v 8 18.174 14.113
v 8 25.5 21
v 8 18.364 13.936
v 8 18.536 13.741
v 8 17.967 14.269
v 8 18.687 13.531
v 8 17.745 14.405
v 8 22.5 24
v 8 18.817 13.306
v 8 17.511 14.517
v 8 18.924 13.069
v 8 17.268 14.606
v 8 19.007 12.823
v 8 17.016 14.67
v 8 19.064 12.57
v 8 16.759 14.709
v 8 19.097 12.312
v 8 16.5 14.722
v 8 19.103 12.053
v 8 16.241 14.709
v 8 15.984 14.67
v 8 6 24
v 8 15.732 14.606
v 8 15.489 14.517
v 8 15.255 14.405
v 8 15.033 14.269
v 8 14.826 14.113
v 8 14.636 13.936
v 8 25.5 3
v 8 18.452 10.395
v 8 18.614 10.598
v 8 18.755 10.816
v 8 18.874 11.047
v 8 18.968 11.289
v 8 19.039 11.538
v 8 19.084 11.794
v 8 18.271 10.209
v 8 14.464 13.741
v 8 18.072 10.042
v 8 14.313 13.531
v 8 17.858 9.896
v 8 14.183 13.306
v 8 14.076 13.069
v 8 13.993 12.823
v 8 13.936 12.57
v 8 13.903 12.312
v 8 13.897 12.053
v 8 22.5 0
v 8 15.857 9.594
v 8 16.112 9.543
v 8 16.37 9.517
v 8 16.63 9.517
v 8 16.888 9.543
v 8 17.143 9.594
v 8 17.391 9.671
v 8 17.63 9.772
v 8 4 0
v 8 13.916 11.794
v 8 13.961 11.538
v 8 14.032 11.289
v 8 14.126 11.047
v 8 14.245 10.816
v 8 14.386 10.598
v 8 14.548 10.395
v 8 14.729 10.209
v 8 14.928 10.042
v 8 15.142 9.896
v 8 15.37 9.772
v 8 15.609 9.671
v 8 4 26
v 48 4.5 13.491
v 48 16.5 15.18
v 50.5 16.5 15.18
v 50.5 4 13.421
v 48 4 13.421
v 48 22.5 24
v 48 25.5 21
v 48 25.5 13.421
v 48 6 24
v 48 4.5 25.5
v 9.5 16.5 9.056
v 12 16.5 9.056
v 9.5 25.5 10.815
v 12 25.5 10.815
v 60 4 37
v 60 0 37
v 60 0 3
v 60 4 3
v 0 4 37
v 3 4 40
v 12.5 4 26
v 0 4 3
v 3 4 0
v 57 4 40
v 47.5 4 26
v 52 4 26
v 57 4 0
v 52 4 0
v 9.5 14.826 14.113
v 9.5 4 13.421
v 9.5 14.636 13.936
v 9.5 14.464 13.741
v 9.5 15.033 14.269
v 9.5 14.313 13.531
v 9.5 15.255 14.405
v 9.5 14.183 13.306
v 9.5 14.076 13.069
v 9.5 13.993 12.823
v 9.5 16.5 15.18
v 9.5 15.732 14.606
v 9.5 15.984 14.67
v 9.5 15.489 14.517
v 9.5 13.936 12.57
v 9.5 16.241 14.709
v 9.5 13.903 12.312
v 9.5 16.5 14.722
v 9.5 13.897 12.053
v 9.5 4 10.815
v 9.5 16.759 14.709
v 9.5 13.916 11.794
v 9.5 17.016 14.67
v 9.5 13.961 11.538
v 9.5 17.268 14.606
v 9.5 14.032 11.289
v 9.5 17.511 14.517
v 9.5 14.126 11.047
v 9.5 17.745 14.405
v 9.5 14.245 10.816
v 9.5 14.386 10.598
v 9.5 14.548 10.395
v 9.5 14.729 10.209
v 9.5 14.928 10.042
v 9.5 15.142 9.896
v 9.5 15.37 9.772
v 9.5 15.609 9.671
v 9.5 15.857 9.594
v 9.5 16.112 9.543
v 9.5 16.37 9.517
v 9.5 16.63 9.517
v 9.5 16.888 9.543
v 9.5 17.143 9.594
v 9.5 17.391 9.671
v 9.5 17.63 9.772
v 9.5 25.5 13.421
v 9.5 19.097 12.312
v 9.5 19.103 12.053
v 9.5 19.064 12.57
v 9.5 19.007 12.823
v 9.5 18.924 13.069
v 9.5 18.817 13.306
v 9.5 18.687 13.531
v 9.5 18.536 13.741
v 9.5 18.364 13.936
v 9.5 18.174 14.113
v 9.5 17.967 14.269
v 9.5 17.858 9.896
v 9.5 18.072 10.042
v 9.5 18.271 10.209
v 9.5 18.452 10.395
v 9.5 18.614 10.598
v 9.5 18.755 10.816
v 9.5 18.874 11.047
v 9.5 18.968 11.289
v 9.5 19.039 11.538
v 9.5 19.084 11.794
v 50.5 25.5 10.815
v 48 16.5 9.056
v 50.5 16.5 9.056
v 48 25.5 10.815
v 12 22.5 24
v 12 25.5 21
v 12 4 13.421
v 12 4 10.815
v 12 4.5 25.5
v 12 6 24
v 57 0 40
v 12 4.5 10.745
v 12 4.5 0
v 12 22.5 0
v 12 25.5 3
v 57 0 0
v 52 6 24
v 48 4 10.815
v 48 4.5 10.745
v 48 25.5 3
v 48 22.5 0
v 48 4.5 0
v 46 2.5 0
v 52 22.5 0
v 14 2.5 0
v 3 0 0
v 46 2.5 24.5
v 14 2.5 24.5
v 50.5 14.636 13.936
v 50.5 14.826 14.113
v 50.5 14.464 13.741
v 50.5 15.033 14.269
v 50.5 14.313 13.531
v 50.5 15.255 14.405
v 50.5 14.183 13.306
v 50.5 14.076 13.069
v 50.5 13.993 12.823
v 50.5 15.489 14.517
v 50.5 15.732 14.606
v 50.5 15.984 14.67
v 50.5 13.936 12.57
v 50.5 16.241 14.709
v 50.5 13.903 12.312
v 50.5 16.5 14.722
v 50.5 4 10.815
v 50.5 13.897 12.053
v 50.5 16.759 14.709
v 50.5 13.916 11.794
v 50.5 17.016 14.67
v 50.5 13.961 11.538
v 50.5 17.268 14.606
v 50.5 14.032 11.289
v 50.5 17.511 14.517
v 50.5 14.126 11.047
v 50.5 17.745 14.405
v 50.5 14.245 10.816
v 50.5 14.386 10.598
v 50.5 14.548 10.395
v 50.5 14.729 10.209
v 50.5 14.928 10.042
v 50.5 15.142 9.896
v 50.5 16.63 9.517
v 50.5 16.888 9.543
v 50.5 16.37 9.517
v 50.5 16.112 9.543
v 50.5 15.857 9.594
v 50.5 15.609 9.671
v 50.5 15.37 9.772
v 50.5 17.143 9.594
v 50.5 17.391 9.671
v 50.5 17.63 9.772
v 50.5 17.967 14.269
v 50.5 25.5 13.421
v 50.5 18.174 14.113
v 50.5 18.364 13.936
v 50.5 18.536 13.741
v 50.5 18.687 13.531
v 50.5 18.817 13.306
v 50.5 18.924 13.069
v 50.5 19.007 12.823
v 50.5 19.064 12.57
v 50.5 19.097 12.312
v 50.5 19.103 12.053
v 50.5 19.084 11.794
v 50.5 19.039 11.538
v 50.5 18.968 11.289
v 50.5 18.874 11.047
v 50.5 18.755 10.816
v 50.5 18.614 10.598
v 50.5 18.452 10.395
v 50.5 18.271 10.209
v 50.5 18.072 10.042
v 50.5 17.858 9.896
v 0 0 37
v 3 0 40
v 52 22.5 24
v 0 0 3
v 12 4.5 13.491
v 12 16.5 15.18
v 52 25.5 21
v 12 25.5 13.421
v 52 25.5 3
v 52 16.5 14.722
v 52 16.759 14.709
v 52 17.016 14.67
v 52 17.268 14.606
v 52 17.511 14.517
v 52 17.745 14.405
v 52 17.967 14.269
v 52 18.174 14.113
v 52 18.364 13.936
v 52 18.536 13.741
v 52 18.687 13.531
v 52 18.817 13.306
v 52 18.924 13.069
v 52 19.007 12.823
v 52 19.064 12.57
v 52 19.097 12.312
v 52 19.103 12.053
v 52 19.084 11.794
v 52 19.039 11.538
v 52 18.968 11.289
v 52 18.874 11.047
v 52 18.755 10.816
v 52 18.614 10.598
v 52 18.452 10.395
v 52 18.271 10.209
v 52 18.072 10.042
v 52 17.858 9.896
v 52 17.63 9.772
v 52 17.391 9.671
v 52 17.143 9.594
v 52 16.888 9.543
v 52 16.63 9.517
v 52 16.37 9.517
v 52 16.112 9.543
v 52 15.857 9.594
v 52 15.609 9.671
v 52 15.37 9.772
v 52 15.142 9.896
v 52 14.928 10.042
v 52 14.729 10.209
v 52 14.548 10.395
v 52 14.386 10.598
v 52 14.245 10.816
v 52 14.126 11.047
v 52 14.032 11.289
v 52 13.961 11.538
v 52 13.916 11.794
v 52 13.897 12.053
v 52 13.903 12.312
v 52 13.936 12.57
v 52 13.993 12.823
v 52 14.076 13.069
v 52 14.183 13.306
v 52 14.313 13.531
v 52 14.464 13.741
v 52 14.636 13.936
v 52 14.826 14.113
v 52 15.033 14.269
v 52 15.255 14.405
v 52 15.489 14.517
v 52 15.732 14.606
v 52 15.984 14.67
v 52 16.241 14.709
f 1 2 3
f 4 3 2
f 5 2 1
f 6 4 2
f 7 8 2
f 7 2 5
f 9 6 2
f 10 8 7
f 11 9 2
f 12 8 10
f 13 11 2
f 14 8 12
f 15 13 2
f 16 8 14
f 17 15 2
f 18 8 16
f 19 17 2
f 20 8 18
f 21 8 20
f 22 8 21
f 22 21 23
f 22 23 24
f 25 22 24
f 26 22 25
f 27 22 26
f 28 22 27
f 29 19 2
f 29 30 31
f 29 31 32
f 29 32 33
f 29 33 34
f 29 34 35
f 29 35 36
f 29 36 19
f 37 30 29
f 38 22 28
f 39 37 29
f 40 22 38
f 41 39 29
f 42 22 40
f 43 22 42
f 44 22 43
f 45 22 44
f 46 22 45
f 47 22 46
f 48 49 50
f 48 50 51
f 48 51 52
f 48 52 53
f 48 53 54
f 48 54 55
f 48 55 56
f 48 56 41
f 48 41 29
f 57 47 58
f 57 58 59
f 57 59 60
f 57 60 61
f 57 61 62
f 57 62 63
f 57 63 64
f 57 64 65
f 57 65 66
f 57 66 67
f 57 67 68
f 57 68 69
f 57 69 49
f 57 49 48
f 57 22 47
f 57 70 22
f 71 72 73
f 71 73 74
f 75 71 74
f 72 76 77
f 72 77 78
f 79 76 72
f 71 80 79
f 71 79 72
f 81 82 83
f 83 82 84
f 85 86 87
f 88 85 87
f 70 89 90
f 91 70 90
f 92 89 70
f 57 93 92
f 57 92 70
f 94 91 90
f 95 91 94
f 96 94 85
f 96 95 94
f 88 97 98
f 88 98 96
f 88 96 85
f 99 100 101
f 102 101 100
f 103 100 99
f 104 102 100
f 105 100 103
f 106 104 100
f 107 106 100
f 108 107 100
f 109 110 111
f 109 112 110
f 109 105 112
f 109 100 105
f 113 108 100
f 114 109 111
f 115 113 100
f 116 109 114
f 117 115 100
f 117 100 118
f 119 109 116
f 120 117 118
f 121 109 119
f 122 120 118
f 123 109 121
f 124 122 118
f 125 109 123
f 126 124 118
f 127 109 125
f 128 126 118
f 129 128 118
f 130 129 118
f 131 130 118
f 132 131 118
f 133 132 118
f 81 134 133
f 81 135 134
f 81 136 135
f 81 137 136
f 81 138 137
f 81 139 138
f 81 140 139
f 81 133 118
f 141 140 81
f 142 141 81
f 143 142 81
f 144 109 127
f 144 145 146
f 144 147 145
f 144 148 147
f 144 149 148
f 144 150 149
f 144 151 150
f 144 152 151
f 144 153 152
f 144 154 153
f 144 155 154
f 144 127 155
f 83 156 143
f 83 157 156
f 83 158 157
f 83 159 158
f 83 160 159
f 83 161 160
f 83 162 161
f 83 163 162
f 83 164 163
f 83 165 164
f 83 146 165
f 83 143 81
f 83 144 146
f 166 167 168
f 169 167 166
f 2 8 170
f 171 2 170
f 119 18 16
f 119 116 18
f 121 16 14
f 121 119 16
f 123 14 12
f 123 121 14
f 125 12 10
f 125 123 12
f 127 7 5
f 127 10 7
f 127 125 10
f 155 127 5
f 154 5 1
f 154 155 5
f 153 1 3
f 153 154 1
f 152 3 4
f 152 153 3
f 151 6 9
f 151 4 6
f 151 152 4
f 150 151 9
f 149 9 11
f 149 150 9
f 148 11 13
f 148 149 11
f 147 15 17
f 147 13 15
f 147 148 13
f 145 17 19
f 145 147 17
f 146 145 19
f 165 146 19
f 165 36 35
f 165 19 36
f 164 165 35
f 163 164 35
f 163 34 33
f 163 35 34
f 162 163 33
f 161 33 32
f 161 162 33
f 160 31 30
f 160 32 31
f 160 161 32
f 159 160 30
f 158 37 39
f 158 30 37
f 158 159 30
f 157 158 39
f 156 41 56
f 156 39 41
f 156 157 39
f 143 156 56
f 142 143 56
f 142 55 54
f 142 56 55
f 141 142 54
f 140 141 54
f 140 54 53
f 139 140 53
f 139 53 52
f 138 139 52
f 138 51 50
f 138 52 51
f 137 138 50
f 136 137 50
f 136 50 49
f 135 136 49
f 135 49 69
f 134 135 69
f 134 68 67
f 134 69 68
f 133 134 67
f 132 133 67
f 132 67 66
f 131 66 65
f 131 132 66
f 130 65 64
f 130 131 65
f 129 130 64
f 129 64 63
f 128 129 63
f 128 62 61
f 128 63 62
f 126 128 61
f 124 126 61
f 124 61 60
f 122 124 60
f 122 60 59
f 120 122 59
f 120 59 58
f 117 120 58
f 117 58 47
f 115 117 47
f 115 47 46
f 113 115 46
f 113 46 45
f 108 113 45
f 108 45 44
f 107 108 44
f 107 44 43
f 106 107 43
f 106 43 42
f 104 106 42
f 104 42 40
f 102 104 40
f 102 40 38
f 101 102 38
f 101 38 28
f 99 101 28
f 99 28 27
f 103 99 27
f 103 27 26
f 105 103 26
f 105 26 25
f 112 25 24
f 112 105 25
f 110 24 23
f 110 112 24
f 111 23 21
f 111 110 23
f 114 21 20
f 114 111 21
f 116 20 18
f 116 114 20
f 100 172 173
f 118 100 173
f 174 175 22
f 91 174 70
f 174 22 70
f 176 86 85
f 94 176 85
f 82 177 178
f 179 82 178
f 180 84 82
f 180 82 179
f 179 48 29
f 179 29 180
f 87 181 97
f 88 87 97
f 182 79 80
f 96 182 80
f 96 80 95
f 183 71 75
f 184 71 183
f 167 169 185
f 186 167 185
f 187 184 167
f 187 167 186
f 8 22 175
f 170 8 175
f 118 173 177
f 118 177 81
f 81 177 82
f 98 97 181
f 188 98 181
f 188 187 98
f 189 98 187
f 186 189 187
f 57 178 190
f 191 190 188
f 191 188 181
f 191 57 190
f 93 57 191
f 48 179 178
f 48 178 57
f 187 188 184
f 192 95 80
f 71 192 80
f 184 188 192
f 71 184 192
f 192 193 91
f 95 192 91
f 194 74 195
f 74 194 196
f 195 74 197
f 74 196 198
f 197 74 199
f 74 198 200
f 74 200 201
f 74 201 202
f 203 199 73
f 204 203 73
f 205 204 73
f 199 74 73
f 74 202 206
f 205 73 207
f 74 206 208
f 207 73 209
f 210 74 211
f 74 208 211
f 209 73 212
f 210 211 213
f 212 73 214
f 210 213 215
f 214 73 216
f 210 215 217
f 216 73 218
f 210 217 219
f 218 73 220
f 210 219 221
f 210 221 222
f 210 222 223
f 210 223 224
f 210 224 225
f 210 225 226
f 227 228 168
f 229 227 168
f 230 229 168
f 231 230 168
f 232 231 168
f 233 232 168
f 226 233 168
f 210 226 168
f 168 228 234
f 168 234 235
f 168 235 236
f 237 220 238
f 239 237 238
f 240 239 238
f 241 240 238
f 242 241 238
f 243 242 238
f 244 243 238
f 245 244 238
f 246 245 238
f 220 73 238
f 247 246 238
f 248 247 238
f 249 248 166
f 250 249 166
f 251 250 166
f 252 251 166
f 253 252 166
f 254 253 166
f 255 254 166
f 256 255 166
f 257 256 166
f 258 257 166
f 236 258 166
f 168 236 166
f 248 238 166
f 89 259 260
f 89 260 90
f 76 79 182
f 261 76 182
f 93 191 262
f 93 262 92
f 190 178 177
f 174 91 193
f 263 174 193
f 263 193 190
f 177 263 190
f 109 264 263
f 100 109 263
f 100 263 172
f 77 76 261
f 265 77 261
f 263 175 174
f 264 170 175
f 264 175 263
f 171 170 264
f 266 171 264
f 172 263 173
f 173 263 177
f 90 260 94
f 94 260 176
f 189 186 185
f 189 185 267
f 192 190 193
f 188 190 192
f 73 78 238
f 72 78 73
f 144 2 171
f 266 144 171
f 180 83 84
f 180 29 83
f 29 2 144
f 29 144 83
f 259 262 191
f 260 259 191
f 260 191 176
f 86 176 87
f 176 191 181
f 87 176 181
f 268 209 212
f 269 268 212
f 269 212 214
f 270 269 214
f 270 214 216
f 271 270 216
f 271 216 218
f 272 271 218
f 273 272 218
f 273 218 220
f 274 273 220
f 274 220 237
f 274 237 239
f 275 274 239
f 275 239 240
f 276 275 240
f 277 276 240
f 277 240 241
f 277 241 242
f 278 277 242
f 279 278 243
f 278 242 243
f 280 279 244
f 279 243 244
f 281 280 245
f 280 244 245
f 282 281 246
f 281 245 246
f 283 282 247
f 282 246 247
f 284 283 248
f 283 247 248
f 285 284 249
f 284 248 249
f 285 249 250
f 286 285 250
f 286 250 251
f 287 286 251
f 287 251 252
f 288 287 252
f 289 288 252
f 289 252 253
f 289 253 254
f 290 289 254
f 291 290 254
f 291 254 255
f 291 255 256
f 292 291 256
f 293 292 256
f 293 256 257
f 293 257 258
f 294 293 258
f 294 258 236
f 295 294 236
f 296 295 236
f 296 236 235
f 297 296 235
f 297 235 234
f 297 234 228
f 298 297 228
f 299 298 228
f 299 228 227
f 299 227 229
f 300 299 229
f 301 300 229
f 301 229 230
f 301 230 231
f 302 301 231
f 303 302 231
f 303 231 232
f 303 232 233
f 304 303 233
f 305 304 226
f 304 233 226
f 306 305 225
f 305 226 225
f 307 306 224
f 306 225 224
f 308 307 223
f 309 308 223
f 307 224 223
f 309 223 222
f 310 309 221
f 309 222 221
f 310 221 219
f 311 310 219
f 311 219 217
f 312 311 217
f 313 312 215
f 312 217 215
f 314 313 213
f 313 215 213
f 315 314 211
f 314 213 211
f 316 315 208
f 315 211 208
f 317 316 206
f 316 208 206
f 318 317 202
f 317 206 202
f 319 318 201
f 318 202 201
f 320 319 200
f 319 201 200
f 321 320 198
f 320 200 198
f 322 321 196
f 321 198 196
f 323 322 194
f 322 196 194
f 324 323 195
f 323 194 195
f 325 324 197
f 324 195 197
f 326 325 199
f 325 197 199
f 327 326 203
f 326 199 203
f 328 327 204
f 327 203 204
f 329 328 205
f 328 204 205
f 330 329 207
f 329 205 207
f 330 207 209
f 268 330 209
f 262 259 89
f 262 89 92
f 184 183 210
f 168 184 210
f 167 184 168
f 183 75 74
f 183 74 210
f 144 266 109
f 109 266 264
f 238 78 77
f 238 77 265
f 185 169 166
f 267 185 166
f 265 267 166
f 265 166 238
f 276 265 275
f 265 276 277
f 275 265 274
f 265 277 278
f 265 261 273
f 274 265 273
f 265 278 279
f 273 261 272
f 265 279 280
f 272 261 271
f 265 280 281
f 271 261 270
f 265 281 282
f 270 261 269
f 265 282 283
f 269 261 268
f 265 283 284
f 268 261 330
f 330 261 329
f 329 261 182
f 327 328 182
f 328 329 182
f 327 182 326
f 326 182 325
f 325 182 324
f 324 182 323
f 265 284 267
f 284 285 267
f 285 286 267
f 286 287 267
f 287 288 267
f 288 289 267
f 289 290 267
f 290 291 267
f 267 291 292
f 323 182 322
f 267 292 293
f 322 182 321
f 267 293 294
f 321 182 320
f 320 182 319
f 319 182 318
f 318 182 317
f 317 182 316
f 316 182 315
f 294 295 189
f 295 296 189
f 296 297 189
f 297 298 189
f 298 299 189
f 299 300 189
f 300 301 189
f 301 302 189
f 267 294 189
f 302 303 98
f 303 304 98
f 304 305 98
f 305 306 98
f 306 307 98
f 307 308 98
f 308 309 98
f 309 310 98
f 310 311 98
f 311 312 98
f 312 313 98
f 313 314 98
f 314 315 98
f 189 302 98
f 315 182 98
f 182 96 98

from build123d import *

# Parameters (mm, degrees)
SKETCH1_W           = 60
SKETCH1_H           = 40
BOSS_EXTRUDE1_DEPTH = 4
CHAMFER1_SIZE       = 3
SKETCH2_W           = 36
SKETCH2_H           = 24
CUT_EXTRUDE1_DEPTH  = 1.5
SKETCH3_W           = 4
SKETCH3_H           = 24
BOSS_EXTRUDE2_DEPTH = 23
CHAMFER2_SIZE       = 3
CHAMFER3_SIZE       = 2
CHAMFER4_SIZE       = 2
CHAMFER5_SIZE       = 2
CUT_EXTRUDE2_DEPTH  = 2.5
SKETCH7_R           = 2.604037506
CUT_EXTRUDE3_DEPTH  = 70.285640648
CUT_EXTRUDE4_DEPTH  = 2.5
SKETCH12_R          = 2.604037506
CUT_EXTRUDE6_DEPTH  = 68.485183559


with BuildPart() as part:
    # Sketch1 → Boss-Extrude1 (new body)
    with BuildSketch(Plane(origin=(0, 0, 0), x_dir=(1, 0, 0), z_dir=(0, 1, 0))):
        with Locations((30, -20)):
            Rectangle(SKETCH1_W, SKETCH1_H)
    extrude(amount=BOSS_EXTRUDE1_DEPTH)

    # Chamfer1
    chamfer1_edges = [part.edges().sort_by_distance(p)[0] for p in [
        (0, 2, 0),
        (60, 2, 0),
        (60, 2, 40),
        (0, 2, 40),
    ]]
    chamfer(chamfer1_edges, length=CHAMFER1_SIZE)

    # Sketch2 → Cut-Extrude1 (cut)
    with BuildSketch(Plane(origin=(0, 4, 0), x_dir=(1, 0, 0), z_dir=(0, 1, 0))):
        with Locations((30, -12)):
            Rectangle(SKETCH2_W, SKETCH2_H)
    extrude(amount=-CUT_EXTRUDE1_DEPTH, mode=Mode.SUBTRACT)

    # Sketch3 → Boss-Extrude2 (add)
    with BuildSketch(Plane(origin=(0, 2.5, 0), x_dir=(1, 0, 0), z_dir=(0, 1, 0))):
        with Locations((50, -12)):
            Rectangle(SKETCH3_W, SKETCH3_H)
        with Locations((10, -12)):
            Rectangle(SKETCH3_W, SKETCH3_H)
    extrude(amount=BOSS_EXTRUDE2_DEPTH)

    # Chamfer2
    chamfer2_edges = [part.edges().sort_by_distance(p)[0] for p in [
        (50, 25.5, 24),
        (50, 25.5, 0),
        (10, 25.5, 0),
        (10, 25.5, 24),
    ]]
    chamfer(chamfer2_edges, length=CHAMFER2_SIZE)

    # Chamfer3
    chamfer3_edges = [part.edges().sort_by_distance(p)[0] for p in [
        (50, 4, 24),
        (10, 4, 24),
    ]]
    chamfer(chamfer3_edges, length=CHAMFER3_SIZE)

    # Chamfer4
    # the kernel refuses this chamfer: 2 mm, written as the material it takes off along each edge
    with BuildSketch(Plane(origin=(48, 4, 24), x_dir=(0, -0.9996219169112968, -0.027495876610585623), z_dir=(-1, 0, 0))) as chamfer4_piece_1_section:
        Polygon((CHAMFER4_SIZE * 0.999621916911, CHAMFER4_SIZE * 0.0274958766106), (-CHAMFER4_SIZE * 0.0274958766106, CHAMFER4_SIZE * 0.999621916911), (0, 0), align=None)
    chamfer4_piece_1 = extrude(amount=36, mode=Mode.PRIVATE)
    chamfer4_piece_1 = split(chamfer4_piece_1, bisect_by=Plane(origin=(30, 2.5, 24.699033576), z_dir=(0, 1, 0)), keep=Keep.TOP, mode=Mode.PRIVATE)
    chamfer4_piece_1 = split(chamfer4_piece_1, bisect_by=Plane(origin=(30, 4.361799404, 25.638200596), z_dir=(0, -0.7071067811865476, -0.7071067811865476)), keep=Keep.TOP, mode=Mode.PRIVATE)
    add(chamfer4_piece_1, mode=Mode.SUBTRACT)

    # Chamfer5
    # the kernel refuses this chamfer: 2 mm, written as the material it adds along each edge
    with BuildSketch(Plane(origin=(12, 2.5, 29.643365976), x_dir=(-0.027495876610586487, 0.9996219169112968, 0), z_dir=(0, 0, -1))) as chamfer5_piece_1_section:
        Polygon((CHAMFER5_SIZE * 0.999621916911, CHAMFER5_SIZE * 0.0274958766106), (-CHAMFER5_SIZE * 0.0274958766106, CHAMFER5_SIZE * 0.999621916911), (0, 0), align=None)
    chamfer5_piece_1 = extrude(amount=29.643365976, mode=Mode.PRIVATE)
    chamfer5_piece_1 = split(chamfer5_piece_1, bisect_by=Plane(origin=(12.696713147, 10.276643426, 19.723356574), z_dir=(0, -0.7071067811865476, -0.7071067811865476)), keep=Keep.TOP, mode=Mode.PRIVATE)
    add(chamfer5_piece_1)
    with BuildSketch(Plane(origin=(48, 2.5, 29.643365976), x_dir=(-0.9996219169112968, -0.027495876610586296, 0), z_dir=(0, 0, -1))) as chamfer5_piece_2_section:
        Polygon((CHAMFER5_SIZE * 0.999621916911, CHAMFER5_SIZE * 0.0274958766106), (-CHAMFER5_SIZE * 0.0274958766106, CHAMFER5_SIZE * 0.999621916911), (0, 0), align=None)
    chamfer5_piece_2 = extrude(amount=29.643365976, mode=Mode.PRIVATE)
    chamfer5_piece_2 = split(chamfer5_piece_2, bisect_by=Plane(origin=(47.833064516, 10.624596774, 19.375403226), z_dir=(0, -0.7071067811865476, -0.7071067811865476)), keep=Keep.TOP, mode=Mode.PRIVATE)
    add(chamfer5_piece_2)

    # Sketch4 → Cut-Extrude2 (cut)
    with BuildSketch(Plane.ZY.offset(-48)):
        Polygon((9.05620064, 16.5), (10.815025537, 25.5), (13.420692052, 25.5), (15.179516949, 16.5), (13.420692052, 4), (10.815025537, 4), align=None)
    extrude(amount=-CUT_EXTRUDE2_DEPTH, mode=Mode.SUBTRACT)

    # Sketch7 → Cut-Extrude3 (cut, through all)
    with BuildSketch(Plane.ZY.offset(-50.5)):
        with Locations((12.117858795, 16.5)):
            Circle(SKETCH7_R)
    extrude(amount=-CUT_EXTRUDE3_DEPTH, mode=Mode.SUBTRACT)

    # Sketch11 → Cut-Extrude4 (cut)
    with BuildSketch(Plane.ZY.offset(-12)):
        Polygon((9.05620064, 16.5), (10.815025537, 25.5), (13.420692052, 25.5), (15.179516949, 16.5), (13.420692052, 4), (10.815025537, 4), align=None)
    extrude(amount=CUT_EXTRUDE4_DEPTH, mode=Mode.SUBTRACT)

    # Sketch12 → Cut-Extrude6 (cut, through all)
    with BuildSketch(Plane.ZY.offset(-12)):
        with Locations((12.117858795, 16.5)):
            Circle(SKETCH12_R)
    extrude(amount=CUT_EXTRUDE6_DEPTH, mode=Mode.SUBTRACT)


solid = part.part
